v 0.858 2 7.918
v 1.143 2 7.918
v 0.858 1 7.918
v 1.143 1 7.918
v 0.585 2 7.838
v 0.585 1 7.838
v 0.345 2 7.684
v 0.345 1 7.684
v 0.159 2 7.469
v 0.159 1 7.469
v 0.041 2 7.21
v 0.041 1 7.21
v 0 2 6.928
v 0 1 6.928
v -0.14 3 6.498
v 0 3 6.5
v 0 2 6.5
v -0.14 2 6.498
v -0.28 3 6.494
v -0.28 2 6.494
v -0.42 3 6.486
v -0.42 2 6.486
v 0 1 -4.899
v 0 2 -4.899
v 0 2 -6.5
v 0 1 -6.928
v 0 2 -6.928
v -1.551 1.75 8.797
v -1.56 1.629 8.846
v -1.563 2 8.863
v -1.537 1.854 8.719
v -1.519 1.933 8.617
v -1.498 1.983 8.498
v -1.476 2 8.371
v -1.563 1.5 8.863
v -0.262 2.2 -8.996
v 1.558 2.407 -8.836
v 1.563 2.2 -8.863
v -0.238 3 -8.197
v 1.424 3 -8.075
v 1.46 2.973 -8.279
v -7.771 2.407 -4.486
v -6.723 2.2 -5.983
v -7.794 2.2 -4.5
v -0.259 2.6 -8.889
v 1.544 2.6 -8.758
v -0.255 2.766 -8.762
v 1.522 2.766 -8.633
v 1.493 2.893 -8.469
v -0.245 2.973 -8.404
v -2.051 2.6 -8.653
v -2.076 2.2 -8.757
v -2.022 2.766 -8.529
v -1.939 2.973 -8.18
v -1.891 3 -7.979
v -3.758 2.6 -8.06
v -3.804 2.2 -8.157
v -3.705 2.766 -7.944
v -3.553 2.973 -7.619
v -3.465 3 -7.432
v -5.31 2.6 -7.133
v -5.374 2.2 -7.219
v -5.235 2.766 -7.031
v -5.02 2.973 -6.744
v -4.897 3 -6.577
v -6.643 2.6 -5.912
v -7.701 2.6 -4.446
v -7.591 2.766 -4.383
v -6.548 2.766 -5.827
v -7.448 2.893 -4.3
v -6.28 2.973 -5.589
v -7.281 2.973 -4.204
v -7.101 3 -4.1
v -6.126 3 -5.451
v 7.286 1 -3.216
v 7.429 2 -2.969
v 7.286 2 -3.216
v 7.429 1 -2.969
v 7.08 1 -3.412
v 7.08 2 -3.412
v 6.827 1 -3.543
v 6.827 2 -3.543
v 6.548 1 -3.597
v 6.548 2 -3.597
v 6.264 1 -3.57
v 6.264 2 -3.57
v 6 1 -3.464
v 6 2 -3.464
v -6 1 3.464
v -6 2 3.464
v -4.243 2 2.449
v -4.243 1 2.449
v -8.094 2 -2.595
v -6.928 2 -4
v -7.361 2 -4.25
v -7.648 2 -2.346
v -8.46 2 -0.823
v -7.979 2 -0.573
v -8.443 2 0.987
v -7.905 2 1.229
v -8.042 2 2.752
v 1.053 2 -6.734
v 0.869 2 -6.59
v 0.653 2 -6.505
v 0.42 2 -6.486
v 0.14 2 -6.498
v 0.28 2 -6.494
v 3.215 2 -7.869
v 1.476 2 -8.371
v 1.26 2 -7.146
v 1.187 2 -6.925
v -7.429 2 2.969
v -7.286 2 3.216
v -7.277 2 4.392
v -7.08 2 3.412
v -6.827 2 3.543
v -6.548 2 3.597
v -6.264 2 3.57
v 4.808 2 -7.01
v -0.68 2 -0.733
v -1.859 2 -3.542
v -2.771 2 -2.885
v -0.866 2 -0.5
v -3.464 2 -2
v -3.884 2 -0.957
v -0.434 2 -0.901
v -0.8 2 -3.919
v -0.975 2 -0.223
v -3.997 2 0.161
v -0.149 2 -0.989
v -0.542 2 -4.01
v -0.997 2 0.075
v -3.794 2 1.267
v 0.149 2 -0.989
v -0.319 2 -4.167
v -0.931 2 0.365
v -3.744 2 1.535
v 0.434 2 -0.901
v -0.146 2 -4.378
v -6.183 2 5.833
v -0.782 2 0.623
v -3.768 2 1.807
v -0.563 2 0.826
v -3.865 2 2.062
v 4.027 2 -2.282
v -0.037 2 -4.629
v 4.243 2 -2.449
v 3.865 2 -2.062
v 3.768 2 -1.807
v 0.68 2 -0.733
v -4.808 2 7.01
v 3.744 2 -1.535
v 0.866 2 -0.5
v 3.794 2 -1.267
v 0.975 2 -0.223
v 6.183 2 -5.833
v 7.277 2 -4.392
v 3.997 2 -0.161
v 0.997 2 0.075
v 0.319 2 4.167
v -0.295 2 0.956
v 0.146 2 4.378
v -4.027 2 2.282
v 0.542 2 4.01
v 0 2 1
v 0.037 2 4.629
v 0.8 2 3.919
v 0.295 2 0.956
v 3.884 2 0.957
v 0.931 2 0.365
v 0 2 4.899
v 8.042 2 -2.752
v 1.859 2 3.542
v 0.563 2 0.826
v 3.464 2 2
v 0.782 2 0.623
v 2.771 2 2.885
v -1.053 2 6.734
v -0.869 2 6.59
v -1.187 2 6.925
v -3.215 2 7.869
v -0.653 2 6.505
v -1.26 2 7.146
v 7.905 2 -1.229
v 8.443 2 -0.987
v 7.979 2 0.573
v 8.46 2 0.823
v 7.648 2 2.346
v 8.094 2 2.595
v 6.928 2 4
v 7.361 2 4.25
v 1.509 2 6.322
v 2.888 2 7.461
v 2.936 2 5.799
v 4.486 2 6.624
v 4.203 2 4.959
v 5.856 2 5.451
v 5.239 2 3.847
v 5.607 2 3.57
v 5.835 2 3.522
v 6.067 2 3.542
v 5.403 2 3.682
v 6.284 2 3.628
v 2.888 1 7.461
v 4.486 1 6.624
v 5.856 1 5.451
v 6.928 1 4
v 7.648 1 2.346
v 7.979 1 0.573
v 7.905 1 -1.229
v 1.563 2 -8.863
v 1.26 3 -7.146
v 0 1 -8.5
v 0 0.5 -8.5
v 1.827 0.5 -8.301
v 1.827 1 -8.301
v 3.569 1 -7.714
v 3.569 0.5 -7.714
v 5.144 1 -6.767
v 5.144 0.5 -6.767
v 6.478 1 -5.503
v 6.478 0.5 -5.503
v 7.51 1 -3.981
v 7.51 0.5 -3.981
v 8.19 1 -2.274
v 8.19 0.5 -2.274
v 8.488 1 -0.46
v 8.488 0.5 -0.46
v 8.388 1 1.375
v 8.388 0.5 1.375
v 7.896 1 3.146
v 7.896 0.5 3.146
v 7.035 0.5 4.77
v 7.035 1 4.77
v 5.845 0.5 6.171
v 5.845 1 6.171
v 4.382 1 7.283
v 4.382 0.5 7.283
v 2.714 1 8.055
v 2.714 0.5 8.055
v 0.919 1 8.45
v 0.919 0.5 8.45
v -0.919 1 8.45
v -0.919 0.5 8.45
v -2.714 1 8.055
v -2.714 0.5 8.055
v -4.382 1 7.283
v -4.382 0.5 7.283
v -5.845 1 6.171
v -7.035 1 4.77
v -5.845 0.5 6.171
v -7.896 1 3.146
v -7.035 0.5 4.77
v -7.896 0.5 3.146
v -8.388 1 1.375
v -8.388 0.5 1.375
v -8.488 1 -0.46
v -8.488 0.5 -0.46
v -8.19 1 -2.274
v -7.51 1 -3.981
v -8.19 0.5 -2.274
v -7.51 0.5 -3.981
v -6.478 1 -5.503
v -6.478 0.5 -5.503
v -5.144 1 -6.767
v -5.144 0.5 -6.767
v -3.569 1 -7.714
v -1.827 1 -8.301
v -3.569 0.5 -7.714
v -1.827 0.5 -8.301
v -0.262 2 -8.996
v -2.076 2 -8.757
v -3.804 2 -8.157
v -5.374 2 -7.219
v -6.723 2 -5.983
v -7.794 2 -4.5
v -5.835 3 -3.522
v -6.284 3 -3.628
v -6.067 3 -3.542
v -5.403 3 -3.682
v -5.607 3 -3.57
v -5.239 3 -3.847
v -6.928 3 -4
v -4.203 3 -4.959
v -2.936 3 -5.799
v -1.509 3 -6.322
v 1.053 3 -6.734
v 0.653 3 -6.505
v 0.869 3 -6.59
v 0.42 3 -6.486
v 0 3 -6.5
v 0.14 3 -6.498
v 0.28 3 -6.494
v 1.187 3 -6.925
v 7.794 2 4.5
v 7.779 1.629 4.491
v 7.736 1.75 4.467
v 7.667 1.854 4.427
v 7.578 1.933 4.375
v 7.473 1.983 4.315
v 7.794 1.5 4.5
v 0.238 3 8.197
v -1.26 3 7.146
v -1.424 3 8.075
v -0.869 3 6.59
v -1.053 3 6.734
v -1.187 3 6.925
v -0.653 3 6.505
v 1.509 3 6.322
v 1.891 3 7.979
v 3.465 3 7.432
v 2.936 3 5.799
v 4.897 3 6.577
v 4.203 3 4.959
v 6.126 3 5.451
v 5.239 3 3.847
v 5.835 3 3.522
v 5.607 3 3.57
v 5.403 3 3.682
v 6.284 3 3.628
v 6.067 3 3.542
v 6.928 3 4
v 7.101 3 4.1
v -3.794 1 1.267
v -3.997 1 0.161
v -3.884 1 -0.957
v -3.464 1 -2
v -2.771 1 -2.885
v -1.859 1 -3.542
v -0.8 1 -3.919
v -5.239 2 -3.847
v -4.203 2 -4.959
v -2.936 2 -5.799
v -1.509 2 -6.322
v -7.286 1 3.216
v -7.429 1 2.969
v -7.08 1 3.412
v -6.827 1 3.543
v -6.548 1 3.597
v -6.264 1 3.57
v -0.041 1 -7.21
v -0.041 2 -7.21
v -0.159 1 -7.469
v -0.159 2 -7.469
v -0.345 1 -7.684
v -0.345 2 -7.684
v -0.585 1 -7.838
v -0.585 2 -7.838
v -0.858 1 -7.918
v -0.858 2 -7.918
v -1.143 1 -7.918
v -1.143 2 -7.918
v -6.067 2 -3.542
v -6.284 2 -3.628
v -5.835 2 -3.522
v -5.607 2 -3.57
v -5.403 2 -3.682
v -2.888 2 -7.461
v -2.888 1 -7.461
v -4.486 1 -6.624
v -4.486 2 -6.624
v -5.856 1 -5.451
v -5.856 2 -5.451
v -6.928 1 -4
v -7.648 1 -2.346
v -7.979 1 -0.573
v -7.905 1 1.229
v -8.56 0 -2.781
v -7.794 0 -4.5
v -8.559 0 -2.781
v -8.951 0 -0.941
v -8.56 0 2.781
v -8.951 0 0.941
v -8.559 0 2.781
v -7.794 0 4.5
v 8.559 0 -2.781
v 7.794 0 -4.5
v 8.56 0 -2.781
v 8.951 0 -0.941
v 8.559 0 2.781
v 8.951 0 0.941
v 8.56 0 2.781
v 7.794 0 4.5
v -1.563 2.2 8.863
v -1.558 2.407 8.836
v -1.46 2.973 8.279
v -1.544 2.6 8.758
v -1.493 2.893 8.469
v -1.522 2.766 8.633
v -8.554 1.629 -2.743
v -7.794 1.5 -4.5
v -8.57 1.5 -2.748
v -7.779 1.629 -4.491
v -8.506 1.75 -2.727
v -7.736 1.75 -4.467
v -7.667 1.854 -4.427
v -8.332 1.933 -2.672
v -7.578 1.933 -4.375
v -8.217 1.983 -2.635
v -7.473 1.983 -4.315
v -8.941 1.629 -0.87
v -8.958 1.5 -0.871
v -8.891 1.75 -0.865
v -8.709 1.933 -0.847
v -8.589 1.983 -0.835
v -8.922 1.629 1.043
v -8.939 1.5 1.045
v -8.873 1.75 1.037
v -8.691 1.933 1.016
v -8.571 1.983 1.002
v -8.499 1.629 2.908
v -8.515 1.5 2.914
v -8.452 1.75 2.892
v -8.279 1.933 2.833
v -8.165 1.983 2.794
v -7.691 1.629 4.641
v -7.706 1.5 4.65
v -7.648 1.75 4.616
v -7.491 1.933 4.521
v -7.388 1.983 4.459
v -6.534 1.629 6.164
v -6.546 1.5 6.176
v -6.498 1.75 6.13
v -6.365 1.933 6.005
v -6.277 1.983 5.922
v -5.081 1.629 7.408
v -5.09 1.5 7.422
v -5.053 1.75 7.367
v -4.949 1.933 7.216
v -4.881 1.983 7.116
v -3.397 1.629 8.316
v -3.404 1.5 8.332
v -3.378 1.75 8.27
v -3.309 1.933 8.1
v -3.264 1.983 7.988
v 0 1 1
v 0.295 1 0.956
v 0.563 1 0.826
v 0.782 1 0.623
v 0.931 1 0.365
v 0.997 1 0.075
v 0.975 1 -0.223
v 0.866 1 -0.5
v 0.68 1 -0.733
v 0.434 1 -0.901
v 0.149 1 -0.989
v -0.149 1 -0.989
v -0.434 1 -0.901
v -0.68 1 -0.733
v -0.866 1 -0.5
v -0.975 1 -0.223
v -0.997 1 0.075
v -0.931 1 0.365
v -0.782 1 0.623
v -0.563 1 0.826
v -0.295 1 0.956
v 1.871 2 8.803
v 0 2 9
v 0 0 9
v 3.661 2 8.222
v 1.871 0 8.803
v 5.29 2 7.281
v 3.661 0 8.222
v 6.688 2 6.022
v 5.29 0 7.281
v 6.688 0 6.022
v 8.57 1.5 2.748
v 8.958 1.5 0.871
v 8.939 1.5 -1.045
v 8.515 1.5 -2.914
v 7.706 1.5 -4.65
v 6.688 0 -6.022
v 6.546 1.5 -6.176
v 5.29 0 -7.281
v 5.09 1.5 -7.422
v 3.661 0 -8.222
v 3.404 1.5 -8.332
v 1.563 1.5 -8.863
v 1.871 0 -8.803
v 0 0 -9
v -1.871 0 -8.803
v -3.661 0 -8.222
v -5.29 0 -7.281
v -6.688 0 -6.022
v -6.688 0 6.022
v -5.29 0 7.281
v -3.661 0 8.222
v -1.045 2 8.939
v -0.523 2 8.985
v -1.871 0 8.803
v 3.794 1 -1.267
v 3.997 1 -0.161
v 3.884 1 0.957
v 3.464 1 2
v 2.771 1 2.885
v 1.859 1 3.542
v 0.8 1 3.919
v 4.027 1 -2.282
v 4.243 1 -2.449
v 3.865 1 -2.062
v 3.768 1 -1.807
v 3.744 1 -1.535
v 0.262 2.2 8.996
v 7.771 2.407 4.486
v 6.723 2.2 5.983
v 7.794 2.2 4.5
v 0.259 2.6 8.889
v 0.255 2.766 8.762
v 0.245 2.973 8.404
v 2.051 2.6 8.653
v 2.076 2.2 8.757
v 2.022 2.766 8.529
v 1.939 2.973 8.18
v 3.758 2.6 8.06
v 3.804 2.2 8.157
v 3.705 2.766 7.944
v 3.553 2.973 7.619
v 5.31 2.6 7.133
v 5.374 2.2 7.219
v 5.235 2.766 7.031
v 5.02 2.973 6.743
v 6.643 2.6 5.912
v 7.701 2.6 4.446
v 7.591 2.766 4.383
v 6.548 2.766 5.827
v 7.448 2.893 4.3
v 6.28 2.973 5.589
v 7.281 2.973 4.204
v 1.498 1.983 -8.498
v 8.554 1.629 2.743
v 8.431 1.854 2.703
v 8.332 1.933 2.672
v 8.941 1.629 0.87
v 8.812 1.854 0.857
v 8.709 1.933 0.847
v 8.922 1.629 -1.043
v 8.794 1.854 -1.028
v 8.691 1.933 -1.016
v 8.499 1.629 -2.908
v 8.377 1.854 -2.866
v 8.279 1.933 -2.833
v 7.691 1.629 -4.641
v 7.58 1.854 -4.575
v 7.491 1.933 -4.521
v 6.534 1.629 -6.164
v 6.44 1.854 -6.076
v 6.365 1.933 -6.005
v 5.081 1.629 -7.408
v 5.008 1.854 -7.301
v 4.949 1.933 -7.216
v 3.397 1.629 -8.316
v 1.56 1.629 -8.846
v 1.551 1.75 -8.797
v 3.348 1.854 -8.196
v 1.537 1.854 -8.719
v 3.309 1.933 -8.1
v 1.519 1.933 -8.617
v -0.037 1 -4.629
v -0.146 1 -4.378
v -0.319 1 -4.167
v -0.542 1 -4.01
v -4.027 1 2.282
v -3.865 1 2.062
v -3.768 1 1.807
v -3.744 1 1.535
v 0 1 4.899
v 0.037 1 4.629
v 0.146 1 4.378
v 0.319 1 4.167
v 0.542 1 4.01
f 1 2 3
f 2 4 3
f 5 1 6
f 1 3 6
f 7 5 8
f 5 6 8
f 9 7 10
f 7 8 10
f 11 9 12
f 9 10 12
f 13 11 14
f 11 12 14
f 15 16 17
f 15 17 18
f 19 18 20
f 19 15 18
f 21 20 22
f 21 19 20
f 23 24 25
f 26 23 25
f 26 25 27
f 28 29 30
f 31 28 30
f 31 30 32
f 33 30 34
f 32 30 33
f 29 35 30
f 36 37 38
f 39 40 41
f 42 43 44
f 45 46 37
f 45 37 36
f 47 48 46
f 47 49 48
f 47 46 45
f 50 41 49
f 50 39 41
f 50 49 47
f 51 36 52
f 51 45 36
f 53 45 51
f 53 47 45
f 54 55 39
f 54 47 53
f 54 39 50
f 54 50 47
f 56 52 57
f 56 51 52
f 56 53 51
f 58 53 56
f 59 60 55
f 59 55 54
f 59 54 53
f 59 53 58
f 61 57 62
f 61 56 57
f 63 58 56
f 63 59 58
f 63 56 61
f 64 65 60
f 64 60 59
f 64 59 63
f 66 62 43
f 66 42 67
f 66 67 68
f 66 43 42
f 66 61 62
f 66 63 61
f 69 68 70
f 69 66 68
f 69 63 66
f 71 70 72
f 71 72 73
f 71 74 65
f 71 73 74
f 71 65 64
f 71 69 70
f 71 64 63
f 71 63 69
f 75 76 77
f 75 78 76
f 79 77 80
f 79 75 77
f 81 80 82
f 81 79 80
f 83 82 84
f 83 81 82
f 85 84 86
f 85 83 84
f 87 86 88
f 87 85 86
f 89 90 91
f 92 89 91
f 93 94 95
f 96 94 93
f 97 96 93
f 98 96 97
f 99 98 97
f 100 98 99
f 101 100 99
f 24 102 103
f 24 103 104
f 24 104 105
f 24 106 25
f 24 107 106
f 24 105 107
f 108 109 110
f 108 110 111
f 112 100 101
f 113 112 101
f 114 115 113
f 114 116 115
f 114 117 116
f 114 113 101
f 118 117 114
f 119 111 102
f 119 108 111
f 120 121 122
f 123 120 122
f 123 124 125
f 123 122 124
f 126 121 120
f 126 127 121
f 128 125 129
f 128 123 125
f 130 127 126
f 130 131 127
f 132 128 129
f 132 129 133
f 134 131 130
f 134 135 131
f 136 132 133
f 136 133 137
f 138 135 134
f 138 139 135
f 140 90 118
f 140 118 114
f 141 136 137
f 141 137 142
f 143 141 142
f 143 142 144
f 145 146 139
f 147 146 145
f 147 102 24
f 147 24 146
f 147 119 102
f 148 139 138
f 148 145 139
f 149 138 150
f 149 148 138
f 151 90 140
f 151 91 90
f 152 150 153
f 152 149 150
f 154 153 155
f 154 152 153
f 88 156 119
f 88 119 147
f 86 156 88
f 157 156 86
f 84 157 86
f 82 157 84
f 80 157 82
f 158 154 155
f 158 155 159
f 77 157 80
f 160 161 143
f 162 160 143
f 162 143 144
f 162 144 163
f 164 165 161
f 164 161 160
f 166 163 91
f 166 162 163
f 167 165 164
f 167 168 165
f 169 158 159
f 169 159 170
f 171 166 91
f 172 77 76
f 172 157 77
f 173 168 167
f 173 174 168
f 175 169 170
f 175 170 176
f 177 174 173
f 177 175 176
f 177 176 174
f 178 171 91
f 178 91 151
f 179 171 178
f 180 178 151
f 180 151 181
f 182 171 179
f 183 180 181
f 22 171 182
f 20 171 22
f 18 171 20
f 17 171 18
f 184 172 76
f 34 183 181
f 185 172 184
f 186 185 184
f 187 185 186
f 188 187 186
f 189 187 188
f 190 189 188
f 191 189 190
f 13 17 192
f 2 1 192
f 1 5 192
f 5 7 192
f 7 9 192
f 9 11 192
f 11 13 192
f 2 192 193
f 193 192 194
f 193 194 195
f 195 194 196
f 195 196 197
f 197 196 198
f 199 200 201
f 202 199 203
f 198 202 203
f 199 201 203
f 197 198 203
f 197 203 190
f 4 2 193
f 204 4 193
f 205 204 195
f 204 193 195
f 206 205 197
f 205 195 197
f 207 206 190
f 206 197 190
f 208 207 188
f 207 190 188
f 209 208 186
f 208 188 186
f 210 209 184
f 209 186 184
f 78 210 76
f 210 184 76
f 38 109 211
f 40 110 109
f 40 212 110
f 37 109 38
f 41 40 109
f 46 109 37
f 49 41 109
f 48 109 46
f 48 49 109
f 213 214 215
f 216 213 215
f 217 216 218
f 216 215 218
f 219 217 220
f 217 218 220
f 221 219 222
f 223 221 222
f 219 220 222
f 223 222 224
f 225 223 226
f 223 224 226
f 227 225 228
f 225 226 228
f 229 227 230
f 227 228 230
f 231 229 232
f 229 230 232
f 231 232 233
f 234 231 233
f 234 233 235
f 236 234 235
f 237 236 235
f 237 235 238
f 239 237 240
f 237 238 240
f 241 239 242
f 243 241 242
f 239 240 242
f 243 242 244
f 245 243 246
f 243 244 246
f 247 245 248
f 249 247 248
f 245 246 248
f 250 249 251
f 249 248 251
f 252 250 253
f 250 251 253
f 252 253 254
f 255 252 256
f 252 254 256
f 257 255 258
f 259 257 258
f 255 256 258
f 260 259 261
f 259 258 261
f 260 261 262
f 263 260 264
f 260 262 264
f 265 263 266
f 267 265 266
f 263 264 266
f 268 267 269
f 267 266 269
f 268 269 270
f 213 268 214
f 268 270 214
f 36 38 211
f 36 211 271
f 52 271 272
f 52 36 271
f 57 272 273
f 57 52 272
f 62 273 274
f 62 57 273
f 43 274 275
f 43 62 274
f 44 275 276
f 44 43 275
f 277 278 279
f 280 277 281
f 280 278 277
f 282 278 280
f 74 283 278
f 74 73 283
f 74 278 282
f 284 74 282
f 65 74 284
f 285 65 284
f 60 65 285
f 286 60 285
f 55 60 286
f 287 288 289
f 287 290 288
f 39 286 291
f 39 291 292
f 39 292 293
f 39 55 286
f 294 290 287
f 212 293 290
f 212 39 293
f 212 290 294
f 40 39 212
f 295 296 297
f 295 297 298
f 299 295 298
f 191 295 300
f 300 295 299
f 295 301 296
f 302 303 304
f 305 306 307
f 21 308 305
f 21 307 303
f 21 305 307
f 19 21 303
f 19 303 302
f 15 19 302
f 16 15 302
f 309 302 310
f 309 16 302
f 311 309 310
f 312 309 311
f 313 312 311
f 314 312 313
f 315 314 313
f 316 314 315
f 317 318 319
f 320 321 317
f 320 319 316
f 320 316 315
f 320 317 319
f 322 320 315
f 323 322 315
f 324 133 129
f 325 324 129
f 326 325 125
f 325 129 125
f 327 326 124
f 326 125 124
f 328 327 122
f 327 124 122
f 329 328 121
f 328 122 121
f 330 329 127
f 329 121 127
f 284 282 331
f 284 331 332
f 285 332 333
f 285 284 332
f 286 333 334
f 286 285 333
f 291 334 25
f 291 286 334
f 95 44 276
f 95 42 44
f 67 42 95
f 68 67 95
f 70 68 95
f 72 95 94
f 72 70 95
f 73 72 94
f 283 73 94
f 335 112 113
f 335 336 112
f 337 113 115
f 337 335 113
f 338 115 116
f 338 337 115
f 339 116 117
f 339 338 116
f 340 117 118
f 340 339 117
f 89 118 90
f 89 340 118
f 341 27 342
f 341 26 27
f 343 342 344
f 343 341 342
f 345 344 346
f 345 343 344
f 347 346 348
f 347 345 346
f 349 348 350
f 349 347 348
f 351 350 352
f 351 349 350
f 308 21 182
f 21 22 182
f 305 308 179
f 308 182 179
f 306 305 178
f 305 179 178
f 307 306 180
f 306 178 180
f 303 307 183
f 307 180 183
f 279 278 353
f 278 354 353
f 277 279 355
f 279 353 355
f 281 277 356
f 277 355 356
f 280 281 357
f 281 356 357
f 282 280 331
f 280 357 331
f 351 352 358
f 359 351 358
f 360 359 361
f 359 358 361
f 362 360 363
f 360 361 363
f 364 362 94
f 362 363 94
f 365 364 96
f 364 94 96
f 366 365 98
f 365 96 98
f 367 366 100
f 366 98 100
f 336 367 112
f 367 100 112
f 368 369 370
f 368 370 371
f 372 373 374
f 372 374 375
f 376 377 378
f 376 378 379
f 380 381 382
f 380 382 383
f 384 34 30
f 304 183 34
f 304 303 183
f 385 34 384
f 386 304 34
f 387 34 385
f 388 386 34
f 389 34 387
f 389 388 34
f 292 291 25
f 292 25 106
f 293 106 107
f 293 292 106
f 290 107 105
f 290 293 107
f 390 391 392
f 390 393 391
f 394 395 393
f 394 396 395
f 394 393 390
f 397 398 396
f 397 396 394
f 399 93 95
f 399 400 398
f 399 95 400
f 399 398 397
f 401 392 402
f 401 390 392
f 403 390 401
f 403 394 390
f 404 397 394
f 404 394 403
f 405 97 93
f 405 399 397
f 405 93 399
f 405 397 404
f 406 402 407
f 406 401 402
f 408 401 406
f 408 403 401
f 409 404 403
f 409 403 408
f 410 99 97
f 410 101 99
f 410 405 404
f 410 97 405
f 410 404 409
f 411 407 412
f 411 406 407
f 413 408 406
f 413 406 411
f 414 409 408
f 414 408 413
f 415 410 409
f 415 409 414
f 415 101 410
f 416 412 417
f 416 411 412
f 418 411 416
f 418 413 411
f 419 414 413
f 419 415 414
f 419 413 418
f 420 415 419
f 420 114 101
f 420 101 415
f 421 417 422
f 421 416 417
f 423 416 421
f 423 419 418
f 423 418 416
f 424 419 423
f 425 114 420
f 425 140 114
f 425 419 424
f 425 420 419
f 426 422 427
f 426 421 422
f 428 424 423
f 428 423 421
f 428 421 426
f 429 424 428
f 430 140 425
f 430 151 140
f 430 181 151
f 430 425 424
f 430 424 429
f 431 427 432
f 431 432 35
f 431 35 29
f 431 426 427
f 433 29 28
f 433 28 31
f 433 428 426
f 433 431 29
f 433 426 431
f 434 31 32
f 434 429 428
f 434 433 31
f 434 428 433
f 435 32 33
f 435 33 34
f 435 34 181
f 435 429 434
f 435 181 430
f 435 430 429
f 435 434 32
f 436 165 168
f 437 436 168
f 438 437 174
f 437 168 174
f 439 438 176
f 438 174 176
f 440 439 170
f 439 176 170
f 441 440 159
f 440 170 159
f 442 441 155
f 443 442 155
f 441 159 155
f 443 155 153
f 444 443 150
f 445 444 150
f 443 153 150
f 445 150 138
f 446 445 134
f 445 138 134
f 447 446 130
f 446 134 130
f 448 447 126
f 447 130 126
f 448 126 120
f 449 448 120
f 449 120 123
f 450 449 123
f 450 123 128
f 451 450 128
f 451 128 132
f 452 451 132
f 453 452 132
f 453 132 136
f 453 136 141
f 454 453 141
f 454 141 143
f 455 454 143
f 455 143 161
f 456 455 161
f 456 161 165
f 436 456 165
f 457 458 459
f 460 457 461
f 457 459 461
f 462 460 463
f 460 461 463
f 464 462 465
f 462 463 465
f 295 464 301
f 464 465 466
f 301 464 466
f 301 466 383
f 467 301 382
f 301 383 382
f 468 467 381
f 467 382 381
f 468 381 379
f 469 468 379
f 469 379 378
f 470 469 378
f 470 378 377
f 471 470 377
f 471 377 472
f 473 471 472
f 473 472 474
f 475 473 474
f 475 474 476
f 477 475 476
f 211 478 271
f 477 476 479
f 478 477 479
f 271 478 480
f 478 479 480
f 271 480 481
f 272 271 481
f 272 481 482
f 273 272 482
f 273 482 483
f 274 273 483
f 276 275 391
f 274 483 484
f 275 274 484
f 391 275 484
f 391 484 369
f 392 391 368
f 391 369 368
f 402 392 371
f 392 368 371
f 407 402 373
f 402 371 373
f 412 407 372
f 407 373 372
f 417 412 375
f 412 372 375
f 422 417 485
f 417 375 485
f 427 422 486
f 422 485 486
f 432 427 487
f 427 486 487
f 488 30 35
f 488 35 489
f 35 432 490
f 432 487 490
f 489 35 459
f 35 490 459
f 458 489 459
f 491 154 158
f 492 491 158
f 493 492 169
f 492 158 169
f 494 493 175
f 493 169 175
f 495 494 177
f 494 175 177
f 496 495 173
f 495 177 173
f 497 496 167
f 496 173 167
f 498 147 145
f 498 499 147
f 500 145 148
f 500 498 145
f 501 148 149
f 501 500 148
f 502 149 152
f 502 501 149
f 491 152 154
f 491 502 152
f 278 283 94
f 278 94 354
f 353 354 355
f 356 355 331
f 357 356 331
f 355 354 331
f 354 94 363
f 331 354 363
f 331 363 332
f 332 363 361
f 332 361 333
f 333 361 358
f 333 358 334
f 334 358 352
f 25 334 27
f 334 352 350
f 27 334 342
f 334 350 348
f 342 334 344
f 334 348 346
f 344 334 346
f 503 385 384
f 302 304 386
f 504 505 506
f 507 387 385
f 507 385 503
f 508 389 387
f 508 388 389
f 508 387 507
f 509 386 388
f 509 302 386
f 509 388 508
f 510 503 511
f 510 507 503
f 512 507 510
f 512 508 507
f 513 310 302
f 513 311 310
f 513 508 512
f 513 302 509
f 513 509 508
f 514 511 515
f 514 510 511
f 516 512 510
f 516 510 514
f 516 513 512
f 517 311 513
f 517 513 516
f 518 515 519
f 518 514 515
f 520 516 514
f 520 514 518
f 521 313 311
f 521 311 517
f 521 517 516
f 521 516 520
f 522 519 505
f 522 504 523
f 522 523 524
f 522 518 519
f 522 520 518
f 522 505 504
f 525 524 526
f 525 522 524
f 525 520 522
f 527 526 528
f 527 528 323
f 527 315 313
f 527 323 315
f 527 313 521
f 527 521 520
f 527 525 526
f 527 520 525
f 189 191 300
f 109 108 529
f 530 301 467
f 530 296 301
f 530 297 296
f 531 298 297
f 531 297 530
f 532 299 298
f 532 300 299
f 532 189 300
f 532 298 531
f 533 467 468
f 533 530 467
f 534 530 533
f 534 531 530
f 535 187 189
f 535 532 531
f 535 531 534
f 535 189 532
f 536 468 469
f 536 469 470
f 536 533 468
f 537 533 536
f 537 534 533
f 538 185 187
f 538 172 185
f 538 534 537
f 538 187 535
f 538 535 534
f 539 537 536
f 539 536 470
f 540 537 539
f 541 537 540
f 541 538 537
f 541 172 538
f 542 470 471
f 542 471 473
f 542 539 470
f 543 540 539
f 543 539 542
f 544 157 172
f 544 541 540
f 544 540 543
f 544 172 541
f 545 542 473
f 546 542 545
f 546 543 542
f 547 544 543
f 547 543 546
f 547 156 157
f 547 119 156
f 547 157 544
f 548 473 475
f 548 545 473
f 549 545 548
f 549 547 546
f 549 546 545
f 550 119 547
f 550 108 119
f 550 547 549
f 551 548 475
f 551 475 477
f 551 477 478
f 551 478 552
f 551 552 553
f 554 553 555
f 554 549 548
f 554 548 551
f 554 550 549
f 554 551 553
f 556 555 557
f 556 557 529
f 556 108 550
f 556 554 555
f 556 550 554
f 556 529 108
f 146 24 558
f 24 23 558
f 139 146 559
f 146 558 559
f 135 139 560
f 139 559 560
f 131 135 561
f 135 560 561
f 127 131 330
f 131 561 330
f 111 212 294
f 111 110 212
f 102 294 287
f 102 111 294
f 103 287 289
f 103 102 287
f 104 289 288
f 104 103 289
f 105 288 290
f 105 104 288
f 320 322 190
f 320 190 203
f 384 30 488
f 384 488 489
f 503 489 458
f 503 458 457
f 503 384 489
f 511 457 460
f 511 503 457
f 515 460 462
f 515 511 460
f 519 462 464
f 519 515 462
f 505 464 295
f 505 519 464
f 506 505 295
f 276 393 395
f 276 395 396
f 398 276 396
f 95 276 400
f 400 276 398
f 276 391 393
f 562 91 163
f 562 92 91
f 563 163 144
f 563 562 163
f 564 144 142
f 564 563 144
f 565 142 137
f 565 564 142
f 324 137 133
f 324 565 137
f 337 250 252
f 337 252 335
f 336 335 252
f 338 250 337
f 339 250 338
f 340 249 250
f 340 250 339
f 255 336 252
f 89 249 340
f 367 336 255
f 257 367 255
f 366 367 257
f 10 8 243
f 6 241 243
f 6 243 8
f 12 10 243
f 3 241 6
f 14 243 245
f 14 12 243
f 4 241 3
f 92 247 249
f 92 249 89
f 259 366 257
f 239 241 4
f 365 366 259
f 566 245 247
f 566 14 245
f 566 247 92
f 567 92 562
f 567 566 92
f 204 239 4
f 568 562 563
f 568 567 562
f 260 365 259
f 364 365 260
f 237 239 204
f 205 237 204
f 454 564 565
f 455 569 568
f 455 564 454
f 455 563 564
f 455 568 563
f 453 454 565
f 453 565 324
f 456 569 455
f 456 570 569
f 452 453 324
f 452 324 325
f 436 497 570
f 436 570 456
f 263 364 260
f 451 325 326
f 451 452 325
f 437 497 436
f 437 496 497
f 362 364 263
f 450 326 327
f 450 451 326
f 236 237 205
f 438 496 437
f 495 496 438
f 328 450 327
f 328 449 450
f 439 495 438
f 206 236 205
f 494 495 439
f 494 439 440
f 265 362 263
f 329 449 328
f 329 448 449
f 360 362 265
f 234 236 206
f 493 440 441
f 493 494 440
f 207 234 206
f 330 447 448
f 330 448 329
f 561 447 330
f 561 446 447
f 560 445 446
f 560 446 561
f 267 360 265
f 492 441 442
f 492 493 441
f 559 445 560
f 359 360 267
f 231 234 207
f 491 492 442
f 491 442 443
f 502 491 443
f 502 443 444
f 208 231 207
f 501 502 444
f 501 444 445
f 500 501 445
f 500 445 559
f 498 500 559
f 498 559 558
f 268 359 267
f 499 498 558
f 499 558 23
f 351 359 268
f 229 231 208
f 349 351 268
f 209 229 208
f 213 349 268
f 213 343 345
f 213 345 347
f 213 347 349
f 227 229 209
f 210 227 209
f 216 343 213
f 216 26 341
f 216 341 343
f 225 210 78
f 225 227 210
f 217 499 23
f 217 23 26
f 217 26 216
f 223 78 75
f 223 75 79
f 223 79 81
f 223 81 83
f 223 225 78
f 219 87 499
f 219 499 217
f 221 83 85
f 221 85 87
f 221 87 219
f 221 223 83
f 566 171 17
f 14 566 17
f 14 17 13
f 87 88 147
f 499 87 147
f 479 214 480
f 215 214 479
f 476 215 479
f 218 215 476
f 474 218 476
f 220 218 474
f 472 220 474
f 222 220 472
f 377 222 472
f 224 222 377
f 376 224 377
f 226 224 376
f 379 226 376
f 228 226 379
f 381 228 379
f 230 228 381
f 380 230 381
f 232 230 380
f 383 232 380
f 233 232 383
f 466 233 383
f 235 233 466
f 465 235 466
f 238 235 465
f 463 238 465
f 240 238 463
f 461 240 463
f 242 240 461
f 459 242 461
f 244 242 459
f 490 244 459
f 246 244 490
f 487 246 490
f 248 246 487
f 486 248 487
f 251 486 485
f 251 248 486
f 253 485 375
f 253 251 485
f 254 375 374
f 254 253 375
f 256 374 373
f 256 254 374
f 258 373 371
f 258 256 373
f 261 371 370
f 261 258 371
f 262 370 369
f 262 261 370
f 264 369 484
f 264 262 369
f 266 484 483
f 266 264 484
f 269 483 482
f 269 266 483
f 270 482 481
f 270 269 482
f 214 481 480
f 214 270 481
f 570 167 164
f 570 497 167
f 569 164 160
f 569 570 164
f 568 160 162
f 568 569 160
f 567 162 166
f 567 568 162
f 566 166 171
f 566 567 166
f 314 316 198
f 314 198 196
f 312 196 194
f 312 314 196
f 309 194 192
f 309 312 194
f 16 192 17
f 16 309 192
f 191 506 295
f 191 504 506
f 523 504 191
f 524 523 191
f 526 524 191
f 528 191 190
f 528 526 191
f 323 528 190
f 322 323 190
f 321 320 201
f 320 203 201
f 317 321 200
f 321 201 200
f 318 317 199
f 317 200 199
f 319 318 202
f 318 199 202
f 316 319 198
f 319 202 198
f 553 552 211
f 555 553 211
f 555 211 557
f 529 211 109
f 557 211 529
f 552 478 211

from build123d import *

# Parameters (mm, degrees)
SKETCH_1_R          = 9
EXTRUDE_1_DEPTH     = 2
SKETCH_2_R          = 8.5
CUT_EXTRUDE_1_DEPTH = 1
CHAMFER_1_SIZE      = 0.5
CUT_EXTRUDE_2_DEPTH = 1
FILLET_1_R          = 1
SKETCH_4_R          = 1
CUT_EXTRUDE_3_DEPTH = 13.884098727
EXTRUDE_START       = 1
EXTRUDE_2_DEPTH     = 1
FILLET_3_R          = 0.8
FILLET_4_R          = 0.8
FILLET_5_R          = 0.5


# Some blends are built 0.0001 mm under size
with BuildPart() as part:
    # 草图1 → 凸台-拉伸1 (new body)
    with BuildSketch(Plane(origin=(0, 0, 0), x_dir=(1, 0, 0), z_dir=(0, 1, 0))):
        with Locations(Location((0, 0, 0), (0, 0, 270))):
            Circle(SKETCH_1_R)
    extrude(amount=EXTRUDE_1_DEPTH)

    # 草图2 → 切除-拉伸1 (cut)
    with BuildSketch(Plane.XZ):
        with Locations(Location((0, 0, 0), (0, 0, 270))):
            Circle(SKETCH_2_R)
    extrude(amount=-CUT_EXTRUDE_1_DEPTH, mode=Mode.SUBTRACT)

    # 倒角1
    chamfer_1_edges = [part.edges().sort_by_distance(p)[0] for p in [
        (0, 0, 8.5),
    ]]
    chamfer(chamfer_1_edges, length=CHAMFER_1_SIZE - 0.0001)  # a hair under: the kernel refuses the full size

    # 草图3 → 切除-拉伸2 (cut)
    with BuildSketch(Plane(origin=(0, 2, 0), x_dir=(1, 0, 0), z_dir=(0, 1, 0))):
        with BuildLine():
            Line((0, 4), (0, 8))
            ThreePointArc((0, 8), (-6.92820323, 4), (-6.92820323, -4))
            Line((-6.92820323, -4), (-3.464101615, -2))
            ThreePointArc((-3.464101615, -2), (-3.464101615, 2), (0, 4))
        make_face()
        with BuildLine():
            ThreePointArc((0, -8), (6.92820323, -4), (6.92820323, 4))
            Line((6.92820323, 4), (3.464101615, 2))
            ThreePointArc((3.464101615, 2), (3.464101615, -2), (0, -4))
            Line((0, -4), (0, -8))
        make_face()
    extrude(amount=-CUT_EXTRUDE_2_DEPTH, mode=Mode.SUBTRACT)

    # 圆角1
    fillet_1_edges = [part.edges().sort_by_distance(p)[0] for p in [
        (0, 1.5, -8),
        (0, 1.5, -4),
        (-3.464101615, 1.5, 2),
        (-6.92820323, 1.5, 4),
        (0, 1.5, 8),
        (0, 1.5, 4),
        (3.464101615, 1.5, -2),
        (6.92820323, 1.5, -4),
    ]]
    fillet(fillet_1_edges, radius=FILLET_1_R)

    # 草图4 → 切除-拉伸3 (cut, through all)
    with BuildSketch(Plane(origin=(0, 2, 0), x_dir=(1, 0, 0), z_dir=(0, 1, 0))):
        with Locations(Location((0, 0, 0), (0, 0, 270))):
            Circle(SKETCH_4_R)
    extrude(amount=-CUT_EXTRUDE_3_DEPTH, mode=Mode.SUBTRACT)

    # 草图5 → 凸台-拉伸2 (add)
    with BuildSketch(Plane(origin=(0, 2, 0), x_dir=(1, 0, 0), z_dir=(0, 1, 0)).offset(EXTRUDE_START)):
        with BuildLine():
            ThreePointArc((1.562833599, 8.863269777), (-3.803564356, 8.156770083), (-7.794228634, 4.5))
            Line((-7.794228634, 4.5), (-6.92820323, 4))
            ThreePointArc((-6.92820323, 4), (-4.485875631, 6.623965566), (-1.142857143, 7.917946549))
            ThreePointArc((-1.142857143, 7.917946549), (-0.345346329, 7.684132176), (0, 6.92820323))
            Line((0, 6.92820323), (0, 6.5))
            ThreePointArc((0, 6.5), (0.566512328, 6.475265538), (1.128713155, 6.401250395))
            Line((1.128713155, 6.401250395), (1.562833599, 8.863269777))
        make_face()
        with BuildLine():
            ThreePointArc((-1.142857143, 7.917946549), (-4.485875631, 6.623965566), (-6.92820323, 4))
            Line((-6.92820323, 4), (-5.629165125, 3.25))
            ThreePointArc((-5.629165125, 3.25), (-3.25, 5.629165125), (0, 6.5))
            Line((0, 6.5), (0, 6.92820323))
            ThreePointArc((0, 6.92820323), (-0.345346329, 7.684132176), (-1.142857143, 7.917946549))
        make_face()
        with BuildLine():
            ThreePointArc((5.629165125, -3.25), (3.25, -5.629165125), (0, -6.5))
            Line((0, -6.5), (0, -6.92820323))
            ThreePointArc((0, -6.92820323), (0.345346329, -7.684132176), (1.142857143, -7.917946549))
            ThreePointArc((1.142857143, -7.917946549), (4.485875631, -6.623965566), (6.92820323, -4))
            Line((6.92820323, -4), (5.629165125, -3.25))
        make_face()
        with BuildLine():
            Line((-1.128713155, -6.401250395), (-1.562833599, -8.863269777))
            ThreePointArc((-1.562833599, -8.863269777), (3.803564356, -8.156770083), (7.794228634, -4.5))
            Line((7.794228634, -4.5), (6.92820323, -4))
            ThreePointArc((6.92820323, -4), (4.485875631, -6.623965566), (1.142857143, -7.917946549))
            ThreePointArc((1.142857143, -7.917946549), (0.345346329, -7.684132176), (0, -6.92820323))
            Line((0, -6.92820323), (0, -6.5))
            ThreePointArc((0, -6.5), (-0.566512328, -6.475265538), (-1.128713155, -6.401250395))
        make_face()
    extrude(amount=-EXTRUDE_2_DEPTH)

    # 圆角3
    fillet_3_edges = [part.edges().sort_by_distance(p)[0] for p in [
        (-3.803564356, 3, -8.156770083),
        (3.803564356, 3, 8.156770083),
    ]]
    fillet(fillet_3_edges, radius=FILLET_3_R)

    # 圆角4
    fillet_4_edges = [part.edges().sort_by_distance(p)[0] for p in [
        (-5.629165125, 2.5, -3.25),
        (1.128713155, 2.5, -6.401250395),
        (5.629165125, 2.5, 3.25),
        (-1.128713155, 2.5, 6.401250395),
    ]]
    fillet(fillet_4_edges, radius=FILLET_4_R)

    # 圆角5
    # the kernel refuses this fillet: 0.5 mm, written as the material it takes off along each edge
    with BuildSketch(Plane(origin=(0, 2, 0), x_dir=(-0.8660254037844409, 0, -0.49999999999999595), z_dir=(0.49999999999999595, 0, -0.8660254037844409))) as fillet_5_piece_1:
        with BuildLine():
            CenterArc((9 - FILLET_5_R, -FILLET_5_R), FILLET_5_R, 0, 90)
            Line((9 - FILLET_5_R, 0), (9, 0))
            Line((9, 0), (9, -FILLET_5_R))
        make_face()
    revolve(axis=Axis((0, 2, 0), (0, 1, 0)), revolution_arc=110, mode=Mode.SUBTRACT)
    with BuildSketch(Plane(origin=(0, 2, 0), x_dir=(0.866025403784441, 0, 0.49999999999999584), z_dir=(-0.49999999999999584, 0, 0.866025403784441))) as fillet_5_piece_2:
        with BuildLine():
            CenterArc((9 - FILLET_5_R, -FILLET_5_R), FILLET_5_R, 0, 90)
            Line((9 - FILLET_5_R, 0), (9, 0))
            Line((9, 0), (9, -FILLET_5_R))
        make_face()
    revolve(axis=Axis((0, 2, 0), (0, 1, 0)), revolution_arc=110, mode=Mode.SUBTRACT)


solid = part.part
